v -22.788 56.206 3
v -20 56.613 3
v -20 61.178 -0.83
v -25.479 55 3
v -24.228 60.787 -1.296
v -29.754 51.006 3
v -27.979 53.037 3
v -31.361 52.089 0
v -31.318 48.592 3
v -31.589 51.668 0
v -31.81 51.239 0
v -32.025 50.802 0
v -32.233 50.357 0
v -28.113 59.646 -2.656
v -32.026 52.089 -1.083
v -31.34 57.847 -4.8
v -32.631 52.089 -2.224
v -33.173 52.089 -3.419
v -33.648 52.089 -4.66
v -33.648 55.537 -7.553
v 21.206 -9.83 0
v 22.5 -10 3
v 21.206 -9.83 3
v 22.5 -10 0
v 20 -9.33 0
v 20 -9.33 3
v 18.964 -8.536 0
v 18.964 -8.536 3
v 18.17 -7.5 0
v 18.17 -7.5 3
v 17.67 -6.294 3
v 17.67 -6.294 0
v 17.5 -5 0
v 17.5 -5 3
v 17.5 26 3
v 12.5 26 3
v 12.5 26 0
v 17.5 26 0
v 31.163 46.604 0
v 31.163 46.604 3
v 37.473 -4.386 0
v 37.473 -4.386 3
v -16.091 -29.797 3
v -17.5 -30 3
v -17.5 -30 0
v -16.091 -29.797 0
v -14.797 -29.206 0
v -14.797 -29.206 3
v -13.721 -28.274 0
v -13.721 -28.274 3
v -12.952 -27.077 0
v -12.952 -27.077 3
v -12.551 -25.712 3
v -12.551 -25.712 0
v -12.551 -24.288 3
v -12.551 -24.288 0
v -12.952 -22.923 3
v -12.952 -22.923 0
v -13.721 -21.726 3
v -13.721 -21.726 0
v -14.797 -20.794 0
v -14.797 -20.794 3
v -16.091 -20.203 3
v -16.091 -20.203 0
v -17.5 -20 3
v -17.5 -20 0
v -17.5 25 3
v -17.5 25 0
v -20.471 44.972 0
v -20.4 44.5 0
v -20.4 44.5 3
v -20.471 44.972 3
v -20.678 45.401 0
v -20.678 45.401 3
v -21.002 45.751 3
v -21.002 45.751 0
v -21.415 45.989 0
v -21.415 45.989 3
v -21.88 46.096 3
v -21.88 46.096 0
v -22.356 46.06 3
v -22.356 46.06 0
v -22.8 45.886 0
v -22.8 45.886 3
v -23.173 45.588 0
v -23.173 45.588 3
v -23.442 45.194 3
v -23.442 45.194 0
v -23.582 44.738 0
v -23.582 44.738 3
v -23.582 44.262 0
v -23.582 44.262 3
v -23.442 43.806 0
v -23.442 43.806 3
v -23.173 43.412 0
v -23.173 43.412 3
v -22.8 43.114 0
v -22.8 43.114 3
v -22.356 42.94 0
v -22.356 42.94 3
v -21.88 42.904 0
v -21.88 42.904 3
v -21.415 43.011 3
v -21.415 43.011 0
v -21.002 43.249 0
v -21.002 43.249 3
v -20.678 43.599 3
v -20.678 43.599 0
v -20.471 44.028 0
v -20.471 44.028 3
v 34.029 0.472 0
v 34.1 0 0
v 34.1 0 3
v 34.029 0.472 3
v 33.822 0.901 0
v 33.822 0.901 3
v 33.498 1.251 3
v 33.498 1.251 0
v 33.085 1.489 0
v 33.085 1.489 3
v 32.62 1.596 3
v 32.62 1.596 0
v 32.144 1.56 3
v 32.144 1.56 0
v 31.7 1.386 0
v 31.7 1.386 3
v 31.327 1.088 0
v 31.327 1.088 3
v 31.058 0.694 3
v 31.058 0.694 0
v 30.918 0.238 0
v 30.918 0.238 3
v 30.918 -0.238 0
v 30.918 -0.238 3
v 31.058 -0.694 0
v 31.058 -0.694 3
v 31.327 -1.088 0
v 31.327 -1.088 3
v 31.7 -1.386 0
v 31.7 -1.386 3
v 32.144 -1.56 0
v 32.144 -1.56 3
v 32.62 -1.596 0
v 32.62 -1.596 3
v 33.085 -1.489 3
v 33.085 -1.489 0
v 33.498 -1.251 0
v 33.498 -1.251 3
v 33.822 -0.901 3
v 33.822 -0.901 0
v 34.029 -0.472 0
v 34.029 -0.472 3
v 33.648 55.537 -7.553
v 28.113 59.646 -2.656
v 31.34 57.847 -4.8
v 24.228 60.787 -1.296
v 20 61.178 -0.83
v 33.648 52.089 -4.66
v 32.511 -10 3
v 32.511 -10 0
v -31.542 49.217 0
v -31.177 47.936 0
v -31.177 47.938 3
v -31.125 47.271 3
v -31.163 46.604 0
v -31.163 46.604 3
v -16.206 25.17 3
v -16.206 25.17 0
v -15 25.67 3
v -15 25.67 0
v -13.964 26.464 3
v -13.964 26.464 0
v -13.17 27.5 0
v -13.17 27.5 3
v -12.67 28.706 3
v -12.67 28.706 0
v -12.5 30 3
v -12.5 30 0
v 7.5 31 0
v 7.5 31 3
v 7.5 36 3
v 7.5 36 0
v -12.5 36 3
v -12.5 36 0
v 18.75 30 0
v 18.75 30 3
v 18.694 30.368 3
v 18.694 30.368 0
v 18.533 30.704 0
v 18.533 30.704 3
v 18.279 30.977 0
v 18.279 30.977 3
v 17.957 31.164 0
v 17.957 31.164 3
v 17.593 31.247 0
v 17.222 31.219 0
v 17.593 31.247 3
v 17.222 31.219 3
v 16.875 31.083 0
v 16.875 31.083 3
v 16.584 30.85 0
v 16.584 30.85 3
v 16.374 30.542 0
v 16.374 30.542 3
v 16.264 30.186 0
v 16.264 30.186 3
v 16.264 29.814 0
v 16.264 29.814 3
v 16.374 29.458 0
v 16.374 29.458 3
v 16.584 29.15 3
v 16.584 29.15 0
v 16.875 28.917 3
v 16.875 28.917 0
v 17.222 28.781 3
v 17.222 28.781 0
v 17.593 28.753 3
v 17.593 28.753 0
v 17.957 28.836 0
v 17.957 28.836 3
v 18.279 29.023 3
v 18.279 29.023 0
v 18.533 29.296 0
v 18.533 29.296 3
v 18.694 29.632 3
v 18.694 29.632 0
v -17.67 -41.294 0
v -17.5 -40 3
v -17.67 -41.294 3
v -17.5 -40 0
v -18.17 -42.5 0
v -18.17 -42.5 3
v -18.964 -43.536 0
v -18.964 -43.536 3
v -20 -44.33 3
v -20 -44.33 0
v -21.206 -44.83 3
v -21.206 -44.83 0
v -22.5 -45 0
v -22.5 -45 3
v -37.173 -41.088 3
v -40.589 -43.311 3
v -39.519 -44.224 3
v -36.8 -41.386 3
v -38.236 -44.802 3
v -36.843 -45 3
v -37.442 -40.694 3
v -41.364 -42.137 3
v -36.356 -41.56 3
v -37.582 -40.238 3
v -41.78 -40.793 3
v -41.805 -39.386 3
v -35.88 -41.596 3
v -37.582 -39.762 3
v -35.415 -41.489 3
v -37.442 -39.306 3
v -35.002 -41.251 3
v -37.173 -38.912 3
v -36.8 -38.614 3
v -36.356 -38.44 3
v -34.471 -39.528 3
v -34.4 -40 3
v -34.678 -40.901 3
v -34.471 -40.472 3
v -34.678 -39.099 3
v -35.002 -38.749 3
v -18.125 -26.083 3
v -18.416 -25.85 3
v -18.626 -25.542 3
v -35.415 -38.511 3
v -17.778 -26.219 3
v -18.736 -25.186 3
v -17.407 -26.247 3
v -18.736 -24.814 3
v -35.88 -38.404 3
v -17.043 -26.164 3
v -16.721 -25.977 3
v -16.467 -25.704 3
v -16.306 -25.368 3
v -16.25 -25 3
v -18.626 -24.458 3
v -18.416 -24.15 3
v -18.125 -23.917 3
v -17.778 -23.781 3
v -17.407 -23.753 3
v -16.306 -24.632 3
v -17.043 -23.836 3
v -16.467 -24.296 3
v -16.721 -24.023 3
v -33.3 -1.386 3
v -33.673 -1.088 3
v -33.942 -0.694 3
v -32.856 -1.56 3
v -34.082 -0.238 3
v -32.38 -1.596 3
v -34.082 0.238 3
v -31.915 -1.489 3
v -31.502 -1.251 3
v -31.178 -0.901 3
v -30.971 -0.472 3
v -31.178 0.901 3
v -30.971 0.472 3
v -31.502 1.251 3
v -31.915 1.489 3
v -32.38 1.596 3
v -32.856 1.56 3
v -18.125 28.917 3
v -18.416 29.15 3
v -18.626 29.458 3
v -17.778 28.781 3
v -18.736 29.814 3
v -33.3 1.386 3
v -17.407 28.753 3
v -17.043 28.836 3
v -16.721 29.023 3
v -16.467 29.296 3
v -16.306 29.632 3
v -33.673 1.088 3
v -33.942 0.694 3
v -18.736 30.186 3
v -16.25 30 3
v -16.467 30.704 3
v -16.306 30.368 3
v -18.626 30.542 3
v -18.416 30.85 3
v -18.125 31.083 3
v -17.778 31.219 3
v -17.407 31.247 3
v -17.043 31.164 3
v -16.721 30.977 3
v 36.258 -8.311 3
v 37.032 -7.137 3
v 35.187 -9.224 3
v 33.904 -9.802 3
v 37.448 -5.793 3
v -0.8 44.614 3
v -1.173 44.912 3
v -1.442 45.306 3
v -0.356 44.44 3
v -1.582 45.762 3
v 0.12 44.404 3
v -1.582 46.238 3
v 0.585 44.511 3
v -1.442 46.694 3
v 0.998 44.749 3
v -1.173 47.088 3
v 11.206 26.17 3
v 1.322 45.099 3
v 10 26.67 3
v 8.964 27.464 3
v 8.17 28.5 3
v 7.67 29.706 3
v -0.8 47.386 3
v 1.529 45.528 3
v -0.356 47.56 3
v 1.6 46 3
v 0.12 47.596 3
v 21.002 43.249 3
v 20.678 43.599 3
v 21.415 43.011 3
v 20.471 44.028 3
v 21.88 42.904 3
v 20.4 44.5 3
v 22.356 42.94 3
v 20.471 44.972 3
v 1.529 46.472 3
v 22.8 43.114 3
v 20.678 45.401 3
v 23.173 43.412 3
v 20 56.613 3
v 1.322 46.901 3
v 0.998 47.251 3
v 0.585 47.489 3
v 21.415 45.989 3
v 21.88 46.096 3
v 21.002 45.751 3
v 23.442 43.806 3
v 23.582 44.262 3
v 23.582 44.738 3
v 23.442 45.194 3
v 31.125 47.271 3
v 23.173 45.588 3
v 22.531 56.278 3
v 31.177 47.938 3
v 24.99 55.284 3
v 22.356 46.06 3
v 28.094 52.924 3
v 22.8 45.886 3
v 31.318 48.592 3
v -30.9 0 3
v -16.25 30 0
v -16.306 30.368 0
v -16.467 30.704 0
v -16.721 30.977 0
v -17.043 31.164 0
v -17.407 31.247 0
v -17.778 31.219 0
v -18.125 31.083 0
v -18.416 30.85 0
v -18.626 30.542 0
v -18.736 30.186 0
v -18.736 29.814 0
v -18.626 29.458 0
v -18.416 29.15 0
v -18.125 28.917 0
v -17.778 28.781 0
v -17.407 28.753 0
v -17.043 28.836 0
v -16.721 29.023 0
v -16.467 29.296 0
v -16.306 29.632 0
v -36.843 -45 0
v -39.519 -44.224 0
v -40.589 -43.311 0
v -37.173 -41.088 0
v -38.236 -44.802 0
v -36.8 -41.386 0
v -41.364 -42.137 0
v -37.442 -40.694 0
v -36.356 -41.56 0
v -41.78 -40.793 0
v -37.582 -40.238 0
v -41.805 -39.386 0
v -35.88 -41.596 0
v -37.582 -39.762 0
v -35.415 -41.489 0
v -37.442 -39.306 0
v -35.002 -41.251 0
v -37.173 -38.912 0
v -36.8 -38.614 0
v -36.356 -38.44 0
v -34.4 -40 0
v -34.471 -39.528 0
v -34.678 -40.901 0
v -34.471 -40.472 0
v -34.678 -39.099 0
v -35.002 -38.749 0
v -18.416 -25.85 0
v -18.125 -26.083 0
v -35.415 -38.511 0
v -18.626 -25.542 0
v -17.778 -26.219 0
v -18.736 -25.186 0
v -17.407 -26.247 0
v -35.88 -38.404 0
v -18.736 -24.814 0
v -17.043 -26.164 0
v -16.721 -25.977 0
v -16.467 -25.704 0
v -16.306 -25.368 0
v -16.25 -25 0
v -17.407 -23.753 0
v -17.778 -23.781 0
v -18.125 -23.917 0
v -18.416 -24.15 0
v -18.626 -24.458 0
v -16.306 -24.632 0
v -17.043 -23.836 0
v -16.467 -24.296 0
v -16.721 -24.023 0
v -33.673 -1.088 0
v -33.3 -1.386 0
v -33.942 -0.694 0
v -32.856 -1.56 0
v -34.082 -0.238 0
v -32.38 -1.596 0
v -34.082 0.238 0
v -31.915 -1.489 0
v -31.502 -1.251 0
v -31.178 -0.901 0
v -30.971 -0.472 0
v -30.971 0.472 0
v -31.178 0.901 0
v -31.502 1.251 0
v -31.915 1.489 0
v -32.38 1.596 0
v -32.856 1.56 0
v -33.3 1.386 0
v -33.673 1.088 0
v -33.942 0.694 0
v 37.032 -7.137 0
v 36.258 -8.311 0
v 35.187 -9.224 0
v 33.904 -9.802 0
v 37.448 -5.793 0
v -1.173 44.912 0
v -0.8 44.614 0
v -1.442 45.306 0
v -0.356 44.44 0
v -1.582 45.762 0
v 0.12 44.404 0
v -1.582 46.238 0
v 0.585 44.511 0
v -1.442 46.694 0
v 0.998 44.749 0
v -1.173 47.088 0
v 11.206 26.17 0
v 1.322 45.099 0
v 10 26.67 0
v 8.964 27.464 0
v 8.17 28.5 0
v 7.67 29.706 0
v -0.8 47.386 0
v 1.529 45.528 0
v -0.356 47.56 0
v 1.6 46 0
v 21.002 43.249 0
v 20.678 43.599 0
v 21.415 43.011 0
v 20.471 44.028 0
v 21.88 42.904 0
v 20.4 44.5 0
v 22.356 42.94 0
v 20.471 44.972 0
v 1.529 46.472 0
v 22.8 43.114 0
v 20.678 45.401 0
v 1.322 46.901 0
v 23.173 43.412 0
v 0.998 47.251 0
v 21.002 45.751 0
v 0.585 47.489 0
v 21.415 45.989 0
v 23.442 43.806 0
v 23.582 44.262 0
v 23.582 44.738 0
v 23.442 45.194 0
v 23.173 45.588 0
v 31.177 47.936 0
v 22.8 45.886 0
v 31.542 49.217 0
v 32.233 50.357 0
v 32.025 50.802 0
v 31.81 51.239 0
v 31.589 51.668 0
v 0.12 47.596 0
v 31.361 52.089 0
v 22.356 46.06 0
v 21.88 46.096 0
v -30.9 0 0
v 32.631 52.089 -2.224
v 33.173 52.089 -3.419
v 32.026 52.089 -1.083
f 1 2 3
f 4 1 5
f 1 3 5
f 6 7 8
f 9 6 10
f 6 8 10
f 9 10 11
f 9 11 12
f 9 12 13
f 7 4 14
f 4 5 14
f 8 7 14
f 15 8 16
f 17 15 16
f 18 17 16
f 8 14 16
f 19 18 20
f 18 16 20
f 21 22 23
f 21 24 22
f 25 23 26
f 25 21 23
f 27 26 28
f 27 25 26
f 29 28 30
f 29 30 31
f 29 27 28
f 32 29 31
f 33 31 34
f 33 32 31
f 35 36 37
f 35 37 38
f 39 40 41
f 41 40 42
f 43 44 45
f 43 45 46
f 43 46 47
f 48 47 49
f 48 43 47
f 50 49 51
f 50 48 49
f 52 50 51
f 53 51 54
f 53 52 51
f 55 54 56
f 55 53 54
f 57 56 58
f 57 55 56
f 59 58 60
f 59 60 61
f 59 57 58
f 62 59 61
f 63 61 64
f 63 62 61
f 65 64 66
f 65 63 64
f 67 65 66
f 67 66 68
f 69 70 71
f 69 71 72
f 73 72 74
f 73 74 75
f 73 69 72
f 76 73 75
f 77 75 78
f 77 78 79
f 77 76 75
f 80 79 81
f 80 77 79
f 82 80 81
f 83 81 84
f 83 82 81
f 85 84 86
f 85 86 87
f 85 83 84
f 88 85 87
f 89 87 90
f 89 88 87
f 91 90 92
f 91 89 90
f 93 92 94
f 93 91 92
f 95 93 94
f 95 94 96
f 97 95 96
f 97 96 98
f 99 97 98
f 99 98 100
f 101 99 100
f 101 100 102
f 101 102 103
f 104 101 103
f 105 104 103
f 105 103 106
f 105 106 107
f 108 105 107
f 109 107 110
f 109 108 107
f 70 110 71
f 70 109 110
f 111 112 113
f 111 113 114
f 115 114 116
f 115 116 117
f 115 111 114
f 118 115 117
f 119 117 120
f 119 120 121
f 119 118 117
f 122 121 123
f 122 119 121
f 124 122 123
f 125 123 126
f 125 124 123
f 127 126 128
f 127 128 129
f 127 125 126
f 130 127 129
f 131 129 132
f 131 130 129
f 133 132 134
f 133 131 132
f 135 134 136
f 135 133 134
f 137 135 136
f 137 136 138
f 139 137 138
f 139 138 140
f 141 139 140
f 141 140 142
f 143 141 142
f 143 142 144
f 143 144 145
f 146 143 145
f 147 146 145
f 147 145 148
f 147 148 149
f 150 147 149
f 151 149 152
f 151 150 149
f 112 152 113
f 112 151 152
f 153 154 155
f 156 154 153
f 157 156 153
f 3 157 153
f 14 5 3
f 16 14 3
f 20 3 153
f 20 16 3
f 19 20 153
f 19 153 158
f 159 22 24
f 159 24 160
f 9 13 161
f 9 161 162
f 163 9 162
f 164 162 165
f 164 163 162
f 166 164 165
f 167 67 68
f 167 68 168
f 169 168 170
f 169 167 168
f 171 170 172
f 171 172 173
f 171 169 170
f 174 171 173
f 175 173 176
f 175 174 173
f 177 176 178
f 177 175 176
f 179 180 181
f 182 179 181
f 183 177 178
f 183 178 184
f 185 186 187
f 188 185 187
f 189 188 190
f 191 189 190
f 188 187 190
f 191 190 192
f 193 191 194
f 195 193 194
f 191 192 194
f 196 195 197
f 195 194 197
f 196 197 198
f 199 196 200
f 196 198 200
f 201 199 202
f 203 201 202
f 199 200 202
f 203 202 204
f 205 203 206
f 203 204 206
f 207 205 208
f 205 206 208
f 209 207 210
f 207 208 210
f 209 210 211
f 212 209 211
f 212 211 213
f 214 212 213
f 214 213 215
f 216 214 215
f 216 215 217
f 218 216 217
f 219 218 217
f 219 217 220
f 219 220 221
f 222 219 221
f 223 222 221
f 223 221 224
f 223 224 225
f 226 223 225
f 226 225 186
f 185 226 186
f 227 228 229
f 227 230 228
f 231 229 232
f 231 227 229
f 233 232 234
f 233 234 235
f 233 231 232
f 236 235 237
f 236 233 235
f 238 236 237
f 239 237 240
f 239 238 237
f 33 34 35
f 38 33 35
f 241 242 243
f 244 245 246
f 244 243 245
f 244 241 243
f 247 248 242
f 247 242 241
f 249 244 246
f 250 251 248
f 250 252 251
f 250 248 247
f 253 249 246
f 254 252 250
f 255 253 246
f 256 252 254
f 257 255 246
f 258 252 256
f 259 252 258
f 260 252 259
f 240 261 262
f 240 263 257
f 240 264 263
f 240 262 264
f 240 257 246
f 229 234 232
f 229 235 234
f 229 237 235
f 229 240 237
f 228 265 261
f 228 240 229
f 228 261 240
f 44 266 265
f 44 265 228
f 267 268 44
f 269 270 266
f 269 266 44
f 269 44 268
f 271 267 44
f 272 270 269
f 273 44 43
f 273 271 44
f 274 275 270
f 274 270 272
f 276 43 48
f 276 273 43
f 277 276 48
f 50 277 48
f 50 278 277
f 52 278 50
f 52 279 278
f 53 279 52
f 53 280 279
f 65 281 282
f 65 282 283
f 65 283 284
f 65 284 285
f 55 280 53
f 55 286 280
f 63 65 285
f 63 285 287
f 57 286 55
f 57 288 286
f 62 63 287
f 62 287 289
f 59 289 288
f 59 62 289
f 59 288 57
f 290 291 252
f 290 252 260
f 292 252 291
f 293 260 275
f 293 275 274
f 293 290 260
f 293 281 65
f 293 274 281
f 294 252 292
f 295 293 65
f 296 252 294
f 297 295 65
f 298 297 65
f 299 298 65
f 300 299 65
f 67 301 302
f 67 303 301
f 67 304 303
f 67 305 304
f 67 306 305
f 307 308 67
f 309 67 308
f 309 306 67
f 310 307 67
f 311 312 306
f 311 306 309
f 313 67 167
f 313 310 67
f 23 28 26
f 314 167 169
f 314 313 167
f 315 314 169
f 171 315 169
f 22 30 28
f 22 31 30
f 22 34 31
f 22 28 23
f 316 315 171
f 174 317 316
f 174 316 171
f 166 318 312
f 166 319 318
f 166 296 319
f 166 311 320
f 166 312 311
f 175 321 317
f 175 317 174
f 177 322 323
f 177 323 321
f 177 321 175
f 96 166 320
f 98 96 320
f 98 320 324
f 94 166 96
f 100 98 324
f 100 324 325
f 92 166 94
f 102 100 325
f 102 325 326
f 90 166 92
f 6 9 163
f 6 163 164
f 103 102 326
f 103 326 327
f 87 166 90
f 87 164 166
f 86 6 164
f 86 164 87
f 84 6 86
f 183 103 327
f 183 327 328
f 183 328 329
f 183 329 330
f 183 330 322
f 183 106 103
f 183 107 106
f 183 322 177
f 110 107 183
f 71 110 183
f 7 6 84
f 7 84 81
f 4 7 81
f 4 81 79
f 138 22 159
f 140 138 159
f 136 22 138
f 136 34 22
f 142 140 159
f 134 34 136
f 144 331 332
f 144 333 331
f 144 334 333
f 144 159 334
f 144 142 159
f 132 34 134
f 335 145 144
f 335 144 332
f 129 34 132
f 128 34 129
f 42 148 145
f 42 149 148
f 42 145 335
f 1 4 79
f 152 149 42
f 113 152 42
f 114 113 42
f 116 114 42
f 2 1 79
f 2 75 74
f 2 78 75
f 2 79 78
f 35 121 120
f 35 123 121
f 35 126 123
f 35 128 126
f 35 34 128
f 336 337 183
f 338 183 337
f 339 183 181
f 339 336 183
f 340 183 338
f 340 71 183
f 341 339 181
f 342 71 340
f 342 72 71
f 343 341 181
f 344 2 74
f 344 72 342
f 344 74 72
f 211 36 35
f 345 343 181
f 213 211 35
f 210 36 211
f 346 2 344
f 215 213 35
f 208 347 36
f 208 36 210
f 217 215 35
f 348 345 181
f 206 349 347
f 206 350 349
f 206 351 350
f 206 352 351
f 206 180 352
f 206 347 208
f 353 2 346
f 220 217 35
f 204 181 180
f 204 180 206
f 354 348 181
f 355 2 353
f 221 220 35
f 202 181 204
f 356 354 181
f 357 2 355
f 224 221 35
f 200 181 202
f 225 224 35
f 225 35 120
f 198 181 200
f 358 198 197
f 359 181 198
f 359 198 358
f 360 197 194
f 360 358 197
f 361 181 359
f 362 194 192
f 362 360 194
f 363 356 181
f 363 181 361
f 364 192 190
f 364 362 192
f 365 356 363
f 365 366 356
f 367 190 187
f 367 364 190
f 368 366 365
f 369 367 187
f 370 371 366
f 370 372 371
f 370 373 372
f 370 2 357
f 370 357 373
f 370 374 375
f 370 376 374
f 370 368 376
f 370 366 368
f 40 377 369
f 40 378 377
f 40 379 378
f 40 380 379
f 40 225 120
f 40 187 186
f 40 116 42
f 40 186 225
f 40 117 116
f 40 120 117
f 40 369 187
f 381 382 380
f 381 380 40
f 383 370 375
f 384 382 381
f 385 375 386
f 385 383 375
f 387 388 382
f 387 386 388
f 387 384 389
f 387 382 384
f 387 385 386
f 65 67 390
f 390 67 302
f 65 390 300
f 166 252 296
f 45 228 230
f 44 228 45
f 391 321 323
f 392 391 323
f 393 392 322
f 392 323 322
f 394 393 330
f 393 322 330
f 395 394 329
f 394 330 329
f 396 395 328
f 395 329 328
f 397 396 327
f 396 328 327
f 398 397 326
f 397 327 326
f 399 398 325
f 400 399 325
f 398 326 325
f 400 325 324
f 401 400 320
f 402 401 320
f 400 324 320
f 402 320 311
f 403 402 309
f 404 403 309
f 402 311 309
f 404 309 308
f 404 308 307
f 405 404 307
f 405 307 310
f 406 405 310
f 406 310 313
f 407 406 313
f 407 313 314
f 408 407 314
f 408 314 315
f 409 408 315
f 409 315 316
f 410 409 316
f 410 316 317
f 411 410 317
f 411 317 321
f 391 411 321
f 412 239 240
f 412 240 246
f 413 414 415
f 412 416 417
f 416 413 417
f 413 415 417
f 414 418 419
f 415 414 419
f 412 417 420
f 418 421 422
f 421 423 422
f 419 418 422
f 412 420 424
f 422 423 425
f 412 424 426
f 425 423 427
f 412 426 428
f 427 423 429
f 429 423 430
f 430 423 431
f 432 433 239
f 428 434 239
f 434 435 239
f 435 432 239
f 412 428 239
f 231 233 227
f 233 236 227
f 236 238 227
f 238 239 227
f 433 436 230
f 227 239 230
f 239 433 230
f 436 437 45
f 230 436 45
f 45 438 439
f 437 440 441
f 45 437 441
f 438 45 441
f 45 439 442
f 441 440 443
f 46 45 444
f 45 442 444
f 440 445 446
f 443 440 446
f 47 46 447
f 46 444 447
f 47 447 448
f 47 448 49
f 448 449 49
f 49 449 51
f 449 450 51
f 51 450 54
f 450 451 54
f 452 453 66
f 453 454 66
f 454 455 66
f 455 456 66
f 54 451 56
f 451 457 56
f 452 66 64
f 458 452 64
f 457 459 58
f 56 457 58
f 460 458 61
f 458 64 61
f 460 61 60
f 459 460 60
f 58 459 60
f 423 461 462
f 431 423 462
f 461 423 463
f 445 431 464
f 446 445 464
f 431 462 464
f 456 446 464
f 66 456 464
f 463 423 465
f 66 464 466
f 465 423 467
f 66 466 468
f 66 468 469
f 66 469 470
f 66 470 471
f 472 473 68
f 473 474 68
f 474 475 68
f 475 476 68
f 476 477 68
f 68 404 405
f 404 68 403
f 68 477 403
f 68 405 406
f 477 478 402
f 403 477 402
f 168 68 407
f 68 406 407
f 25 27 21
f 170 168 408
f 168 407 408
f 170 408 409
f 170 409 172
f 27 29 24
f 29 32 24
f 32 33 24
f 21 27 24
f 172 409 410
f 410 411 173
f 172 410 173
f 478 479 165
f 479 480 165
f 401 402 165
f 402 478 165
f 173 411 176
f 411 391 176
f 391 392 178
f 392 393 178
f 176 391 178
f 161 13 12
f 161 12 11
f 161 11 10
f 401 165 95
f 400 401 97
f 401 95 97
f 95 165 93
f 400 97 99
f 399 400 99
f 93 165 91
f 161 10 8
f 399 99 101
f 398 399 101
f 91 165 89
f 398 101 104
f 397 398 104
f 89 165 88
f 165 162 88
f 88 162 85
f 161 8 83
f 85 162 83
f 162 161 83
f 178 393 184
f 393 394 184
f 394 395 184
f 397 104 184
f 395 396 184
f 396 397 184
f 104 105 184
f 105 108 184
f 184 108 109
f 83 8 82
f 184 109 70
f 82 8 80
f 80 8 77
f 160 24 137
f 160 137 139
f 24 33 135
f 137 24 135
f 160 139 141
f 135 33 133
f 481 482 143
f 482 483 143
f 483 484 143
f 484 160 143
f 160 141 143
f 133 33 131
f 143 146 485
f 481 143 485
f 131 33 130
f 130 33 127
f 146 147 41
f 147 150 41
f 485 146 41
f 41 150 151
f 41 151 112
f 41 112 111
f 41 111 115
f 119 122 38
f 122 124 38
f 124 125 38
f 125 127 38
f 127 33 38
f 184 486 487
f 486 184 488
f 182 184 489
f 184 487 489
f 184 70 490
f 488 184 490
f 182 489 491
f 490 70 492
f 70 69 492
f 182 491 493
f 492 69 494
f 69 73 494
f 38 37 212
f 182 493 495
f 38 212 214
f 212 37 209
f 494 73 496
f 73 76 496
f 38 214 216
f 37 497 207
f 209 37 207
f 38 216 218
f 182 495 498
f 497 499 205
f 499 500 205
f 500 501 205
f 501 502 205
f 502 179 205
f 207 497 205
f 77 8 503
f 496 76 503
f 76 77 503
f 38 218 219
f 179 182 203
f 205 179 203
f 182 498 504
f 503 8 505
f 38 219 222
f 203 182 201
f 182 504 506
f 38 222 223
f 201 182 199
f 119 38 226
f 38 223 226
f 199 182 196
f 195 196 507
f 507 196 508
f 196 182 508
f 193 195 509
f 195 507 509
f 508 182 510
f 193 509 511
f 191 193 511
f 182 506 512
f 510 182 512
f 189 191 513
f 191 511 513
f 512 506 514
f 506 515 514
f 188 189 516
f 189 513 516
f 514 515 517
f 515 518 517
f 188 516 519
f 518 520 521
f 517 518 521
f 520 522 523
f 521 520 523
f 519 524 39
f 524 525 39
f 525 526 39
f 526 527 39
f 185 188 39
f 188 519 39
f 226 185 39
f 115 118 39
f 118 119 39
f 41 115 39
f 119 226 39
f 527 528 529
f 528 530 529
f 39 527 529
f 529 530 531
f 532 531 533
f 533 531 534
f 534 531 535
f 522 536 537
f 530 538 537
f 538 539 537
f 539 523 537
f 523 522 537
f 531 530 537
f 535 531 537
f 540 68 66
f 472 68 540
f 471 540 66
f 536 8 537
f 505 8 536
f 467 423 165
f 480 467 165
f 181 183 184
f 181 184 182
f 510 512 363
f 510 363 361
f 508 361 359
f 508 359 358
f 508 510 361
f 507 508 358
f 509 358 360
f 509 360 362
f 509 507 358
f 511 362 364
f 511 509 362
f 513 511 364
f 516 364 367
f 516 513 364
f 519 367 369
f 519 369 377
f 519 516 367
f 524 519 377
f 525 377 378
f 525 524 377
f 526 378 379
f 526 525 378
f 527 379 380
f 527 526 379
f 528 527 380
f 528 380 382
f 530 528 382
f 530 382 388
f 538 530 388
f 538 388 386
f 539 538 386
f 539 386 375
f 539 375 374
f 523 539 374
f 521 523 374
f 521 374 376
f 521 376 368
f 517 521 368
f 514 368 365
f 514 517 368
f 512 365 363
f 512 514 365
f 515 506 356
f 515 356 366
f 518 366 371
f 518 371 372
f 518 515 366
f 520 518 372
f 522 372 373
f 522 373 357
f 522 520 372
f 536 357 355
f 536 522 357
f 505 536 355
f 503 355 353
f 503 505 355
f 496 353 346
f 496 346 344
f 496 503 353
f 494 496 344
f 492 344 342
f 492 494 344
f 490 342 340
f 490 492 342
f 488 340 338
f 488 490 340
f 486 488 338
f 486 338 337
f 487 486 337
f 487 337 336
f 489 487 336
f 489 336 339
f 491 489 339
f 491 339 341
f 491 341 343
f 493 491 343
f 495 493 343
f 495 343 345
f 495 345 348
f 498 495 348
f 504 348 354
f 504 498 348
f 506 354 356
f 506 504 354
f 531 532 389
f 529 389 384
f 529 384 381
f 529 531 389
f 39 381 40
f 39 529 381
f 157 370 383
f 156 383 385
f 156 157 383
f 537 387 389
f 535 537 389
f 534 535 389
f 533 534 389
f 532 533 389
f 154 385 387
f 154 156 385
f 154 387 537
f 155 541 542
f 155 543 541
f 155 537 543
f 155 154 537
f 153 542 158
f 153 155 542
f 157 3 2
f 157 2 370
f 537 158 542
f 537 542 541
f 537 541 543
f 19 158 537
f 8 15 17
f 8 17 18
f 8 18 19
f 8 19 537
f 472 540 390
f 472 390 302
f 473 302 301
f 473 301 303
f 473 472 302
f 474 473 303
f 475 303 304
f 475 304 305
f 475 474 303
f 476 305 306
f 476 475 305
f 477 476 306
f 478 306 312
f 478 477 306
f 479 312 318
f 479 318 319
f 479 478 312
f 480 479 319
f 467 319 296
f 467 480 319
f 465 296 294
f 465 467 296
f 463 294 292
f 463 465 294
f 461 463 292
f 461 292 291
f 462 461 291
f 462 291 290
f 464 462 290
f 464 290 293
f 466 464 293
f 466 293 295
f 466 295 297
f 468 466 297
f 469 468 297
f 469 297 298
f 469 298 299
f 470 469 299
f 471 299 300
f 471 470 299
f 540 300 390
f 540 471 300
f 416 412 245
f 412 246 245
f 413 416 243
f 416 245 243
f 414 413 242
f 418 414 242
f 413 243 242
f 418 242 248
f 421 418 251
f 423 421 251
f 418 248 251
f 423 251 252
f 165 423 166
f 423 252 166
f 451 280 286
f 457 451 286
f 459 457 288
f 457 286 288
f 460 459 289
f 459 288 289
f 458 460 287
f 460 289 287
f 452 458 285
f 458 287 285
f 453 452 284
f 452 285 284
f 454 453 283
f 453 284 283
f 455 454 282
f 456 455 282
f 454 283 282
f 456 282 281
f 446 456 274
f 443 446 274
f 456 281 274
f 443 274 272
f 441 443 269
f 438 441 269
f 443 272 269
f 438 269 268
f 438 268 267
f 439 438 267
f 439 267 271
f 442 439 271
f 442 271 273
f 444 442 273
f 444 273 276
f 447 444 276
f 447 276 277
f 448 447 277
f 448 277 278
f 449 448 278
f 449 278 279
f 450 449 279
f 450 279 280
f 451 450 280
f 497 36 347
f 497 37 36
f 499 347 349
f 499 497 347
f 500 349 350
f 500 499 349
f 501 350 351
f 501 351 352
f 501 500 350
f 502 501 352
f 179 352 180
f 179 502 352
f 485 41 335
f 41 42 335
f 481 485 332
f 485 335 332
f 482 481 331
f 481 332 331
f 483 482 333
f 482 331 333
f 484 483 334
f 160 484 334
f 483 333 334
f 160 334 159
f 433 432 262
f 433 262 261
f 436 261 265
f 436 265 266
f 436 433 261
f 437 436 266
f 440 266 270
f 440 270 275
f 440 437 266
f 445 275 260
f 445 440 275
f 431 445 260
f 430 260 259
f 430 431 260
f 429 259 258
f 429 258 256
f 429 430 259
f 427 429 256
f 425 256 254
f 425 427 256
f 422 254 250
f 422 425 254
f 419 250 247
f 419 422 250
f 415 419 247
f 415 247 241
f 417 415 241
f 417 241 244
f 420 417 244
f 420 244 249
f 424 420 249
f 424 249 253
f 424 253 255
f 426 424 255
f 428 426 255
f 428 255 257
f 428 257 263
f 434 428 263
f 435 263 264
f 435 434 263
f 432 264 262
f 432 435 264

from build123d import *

# Parameters (mm, degrees)
SKETCH_1_R                  = 1.6
EXTRUDE_1_DEPTH             = 3
CUT_EXTRUDE_1_REACH         = 72.365
SKETCH_2_W                  = 30
SKETCH_2_H                  = 35
CUT_EXTRUDE_2_REACH         = 72.365
SKETCH_3_W                  = 35
SKETCH_3_H                  = 55
CUT_EXTRUDE_3_REACH         = 72.365
SKETCH_4_W                  = 25
SKETCH_4_H                  = 10
EXTRUDE_2_REACH             = 72.365
EXTRUDE_2_DIRECTION_2_REACH = 72.365
EXTRUDE_3_DEPTH             = 35
EXTRUDE_3_DEPTH_BACK        = 35
FILLET_1_R                  = 5
CUT_EXTRUDE_5_REACH         = 99.66
SKETCH_8_W                  = 70
SKETCH_8_H                  = 5
CUT_EXTRUDE_4_REACH         = 99.66
CUT_EXTRUDE_6_REACH         = 101.977
SKETCH_9_W                  = 30
SKETCH_9_H                  = 3
FILLET_2_R                  = 5
CUT_EXTRUDE_7_REACH         = 76.866
SKETCH_10_R                 = 1.25
SKETCH_11_R                 = 5
SKETCH_11_R_2               = 1.25
EXTRUDE_4_DEPTH             = 3


with BuildPart() as part:
    # 草图1 → 凸台-拉伸1 (new body)
    with BuildSketch(Plane.XY):
        Polygon((-30, 56), (30, 56), (42.5, -45), (-42.5, -45), align=None)
        with Locations((-32.5, 0)):
            Circle(SKETCH_1_R, mode=Mode.SUBTRACT)
        with Locations((32.5, 0)):
            Circle(SKETCH_1_R, mode=Mode.SUBTRACT)
        with Locations((-22, 44.5)):
            Circle(SKETCH_1_R, mode=Mode.SUBTRACT)
        with Locations(Location((22, 44.5, 0), (0, 0, 180))):
            Circle(SKETCH_1_R, mode=Mode.SUBTRACT)
        with Locations((0, 46)):
            Circle(SKETCH_1_R, mode=Mode.SUBTRACT)
        with Locations((-36, -40)):
            Circle(SKETCH_1_R, mode=Mode.SUBTRACT)
    extrude(amount=EXTRUDE_1_DEPTH)

    # 草图2 → 切除-拉伸1 (cut, up to next)
    with BuildSketch(Plane.XY.offset(3), mode=Mode.PRIVATE) as cut_extrude_1_sk1:
        with Locations((27.5, -27.5)):
            Rectangle(SKETCH_2_W, SKETCH_2_H)
    cut_extrude_1_tool1 = extrude(cut_extrude_1_sk1.sketch, amount=-CUT_EXTRUDE_1_REACH, mode=Mode.PRIVATE) & part.part
    add(cut_extrude_1_tool1.solids().sort_by_distance((27.5, -27.5, 3))[0], mode=Mode.SUBTRACT)

    # 草图3 → 切除-拉伸2 (cut, up to next)
    with BuildSketch(Plane.XY.offset(3), mode=Mode.PRIVATE) as cut_extrude_2_sk1:
        with Locations((0, -1.5)):
            Rectangle(SKETCH_3_W, SKETCH_3_H)
    cut_extrude_2_tool1 = extrude(cut_extrude_2_sk1.sketch, amount=-CUT_EXTRUDE_2_REACH, mode=Mode.PRIVATE) & part.part
    add(cut_extrude_2_tool1.solids().sort_by_distance((0, -1.5, 3))[0], mode=Mode.SUBTRACT)

    # 草图4 → 切除-拉伸3 (cut, up to next)
    with BuildSketch(Plane.XY.offset(3), mode=Mode.PRIVATE) as cut_extrude_3_sk1:
        with Locations((-5, 31)):
            Rectangle(SKETCH_4_W, SKETCH_4_H)
    cut_extrude_3_tool1 = extrude(cut_extrude_3_sk1.sketch, amount=-CUT_EXTRUDE_3_REACH, mode=Mode.PRIVATE) & part.part
    add(cut_extrude_3_tool1.solids().sort_by_distance((-5, 31, 3))[0], mode=Mode.SUBTRACT)

    # 凸台-拉伸2: up to this plane
    extrude_2_end = Plane(origin=(30, 56, 3), z_dir=(-0.9924283093332451, -0.12282528580856998, 0))
    # 草图5 → 凸台-拉伸2 (add, up to the surface)
    with BuildSketch(Plane(origin=(0, 0, 0), x_dir=(0, 0, -1), z_dir=(1, 0, 0)), mode=Mode.PRIVATE) as extrude_2_sk1:
        Polygon((0, 56), (-3, 58.517298894), (-3, 56), align=None)
    extrude_2_tool1 = split(extrude(extrude_2_sk1.sketch, amount=EXTRUDE_2_REACH, mode=Mode.PRIVATE), bisect_by=extrude_2_end, keep=Keep.BOTH, mode=Mode.PRIVATE)
    add(extrude_2_tool1.solids().sort_by_distance((0, 56.8391, 2))[0])

    # 凸台-拉伸2 direction 2: up to this plane
    extrude_2_direction_2_end = Plane(origin=(-30, 56, 3), z_dir=(0.9924283093332451, -0.12282528580856998, 0))
    # 草图5 → 凸台-拉伸2 direction 2 (add, up to the surface)
    with BuildSketch(Plane(origin=(0, 0, 0), x_dir=(0, 0, -1), z_dir=(1, 0, 0)), mode=Mode.PRIVATE) as extrude_2_direction_2_sk1:
        Polygon((0, 56), (-3, 58.517298894), (-3, 56), align=None)
    extrude_2_direction_2_tool1 = split(extrude(extrude_2_direction_2_sk1.sketch, amount=-EXTRUDE_2_DIRECTION_2_REACH, mode=Mode.PRIVATE), bisect_by=extrude_2_direction_2_end, keep=Keep.BOTH, mode=Mode.PRIVATE)
    add(extrude_2_direction_2_tool1.solids().sort_by_distance((0, 56.8391, 2))[0])

    # 草图6 → 凸台-拉伸3 (add, two sides: drawn at the far end of the back side and taken through both)
    with BuildSketch(Plane(origin=(0, 0, 0), x_dir=(0, 0, -1), z_dir=(1, 0, 0)).offset(-EXTRUDE_3_DEPTH_BACK)):
        Polygon((-3, 58.517298894), (-3, 64.391631696), (7.552988675, 55.536622791), (4.660444431, 52.089422797), (-3, 52.089422797), align=None)
    extrude(amount=EXTRUDE_3_DEPTH + EXTRUDE_3_DEPTH_BACK)

    # 圆角1
    # the kernel refuses this fillet: 5 mm, written as the material it adds along each edge
    with BuildSketch(Plane(origin=(-30.483982327, 52.089422797, 3), x_dir=(-1, 0, 0), z_dir=(0, 0, -1)), Plane(origin=(30.483982327, 52.089422797, 0), x_dir=(1, 0, 0), z_dir=(0, 0, 1))) as fillet_1_piece_1:
        with BuildLine():
            CenterArc((5.641090005, -4.871777114), FILLET_1_R, 103.003728842, 84.05145722)
            Line((0.678948458, -5.485903543), (0.579705627, -5.498186072))
            Line((0.579705627, -5.498186072), (-0.099242831, -0.012282529))
            Line((-0.099242831, -0.012282529), (0, 0.1))
            ThreePointArc((0, 0.1), (2.258008836, 0.1), (4.493516226, 0.097435542))
            Line((4.493516226, 0.097435542), (4.516017673, 0))
        make_face()
    extrude(amount=3)

    # 草图8 → 切除-拉伸5 (cut, up to next)
    with BuildSketch(Plane(origin=(0, 36.309348969, -30.467161328), x_dir=(1, 0, 0), z_dir=(0, 0.7660444431189815, -0.6427876096865354)), mode=Mode.PRIVATE) as cut_extrude_5_sk1:
        with Locations((0, -41.188276351)):
            Rectangle(SKETCH_8_W, SKETCH_8_H)
    cut_extrude_5_tool1 = extrude(cut_extrude_5_sk1.sketch, amount=-CUT_EXTRUDE_5_REACH, mode=Mode.PRIVATE) & part.part
    add(cut_extrude_5_tool1.solids().sort_by_distance((0, 62.784663, 1.084889))[0], mode=Mode.SUBTRACT)

    # 草图7 → 切除-拉伸4 (cut, up to next)
    with BuildSketch(Plane(origin=(0, 36.309348969, -30.467161328), x_dir=(1, 0, 0), z_dir=(0, 0.7660444431189815, -0.6427876096865354)), mode=Mode.PRIVATE) as cut_extrude_4_sk1:
        with BuildLine():
            Line((-35, -23.688276351), (-35, -38.688276351))
            Line((-35, -38.688276351), (-20, -38.688276351))
            ThreePointArc((-20, -38.688276351), (-30.606601718, -34.294878069), (-35, -23.688276351))
        make_face()
    cut_extrude_4_tool1 = extrude(cut_extrude_4_sk1.sketch, amount=-CUT_EXTRUDE_4_REACH, mode=Mode.PRIVATE) & part.part
    # 草图7 → 切除-拉伸4 (cut, up to next)
    with BuildSketch(Plane(origin=(0, 36.309348969, -30.467161328), x_dir=(1, 0, 0), z_dir=(0, 0.7660444431189815, -0.6427876096865354)), mode=Mode.PRIVATE) as cut_extrude_4_sk2:
        with BuildLine():
            Line((35, -38.688276351), (20, -38.688276351))
            ThreePointArc((20, -38.688276351), (30.606601718, -34.294878069), (35, -23.688276351))
            Line((35, -23.688276351), (35, -38.688276351))
        make_face()
    cut_extrude_4_tool2 = extrude(cut_extrude_4_sk2.sketch, amount=-CUT_EXTRUDE_4_REACH, mode=Mode.PRIVATE) & part.part
    add(cut_extrude_4_tool1.solids().sort_by_distance((-31.649481, 59.024021, -3.396869))[0], mode=Mode.SUBTRACT)
    add(cut_extrude_4_tool2.solids().sort_by_distance((31.649481, 59.024021, -3.396869))[0], mode=Mode.SUBTRACT)

    # 草图9 → 切除-拉伸6 (cut, up to next)
    with BuildSketch(Plane(origin=(0, -29, 0), x_dir=(1, 0, 0), z_dir=(0, 1, 0)), mode=Mode.PRIVATE) as cut_extrude_6_sk1:
        with Locations((-2.5, -1.5)):
            Rectangle(SKETCH_9_W, SKETCH_9_H)
    cut_extrude_6_tool1 = extrude(cut_extrude_6_sk1.sketch, amount=-CUT_EXTRUDE_6_REACH, mode=Mode.PRIVATE) & part.part
    add(cut_extrude_6_tool1.solids().sort_by_distance((-2.5, -29, 1.5))[0], mode=Mode.SUBTRACT)

    # 圆角2
    fillet_2_edges = [part.edges().sort_by_distance(p)[0] for p in [
        (-17.5, -45, 1.5),
        (38.168316832, -10, 1.5),
        (17.5, -10, 1.5),
        (7.5, 26, 1.5),
        (-42.5, -45, 1.5),
    ]]
    fillet(fillet_2_edges, radius=FILLET_2_R)

    # 草图10 → 切除-拉伸7 (cut, up to next)
    with BuildSketch(Plane.XY.offset(3), mode=Mode.PRIVATE) as cut_extrude_7_sk1:
        with Locations((17.5, 30)):
            Circle(SKETCH_10_R)
    cut_extrude_7_tool1 = extrude(cut_extrude_7_sk1.sketch, amount=-CUT_EXTRUDE_7_REACH, mode=Mode.PRIVATE) & part.part
    # 草图10 → 切除-拉伸7 (cut, up to next)
    with BuildSketch(Plane.XY.offset(3), mode=Mode.PRIVATE) as cut_extrude_7_sk2:
        with Locations((-17.5, 30)):
            Circle(SKETCH_10_R)
    cut_extrude_7_tool2 = extrude(cut_extrude_7_sk2.sketch, amount=-CUT_EXTRUDE_7_REACH, mode=Mode.PRIVATE) & part.part
    # 草图10 → 切除-拉伸7 (cut, up to next)
    with BuildSketch(Plane.XY.offset(3), mode=Mode.PRIVATE) as cut_extrude_7_sk3:
        with Locations((-17.5, -25)):
            Circle(SKETCH_10_R)
    cut_extrude_7_tool3 = extrude(cut_extrude_7_sk3.sketch, amount=-CUT_EXTRUDE_7_REACH, mode=Mode.PRIVATE) & part.part
    add(cut_extrude_7_tool1.solids().sort_by_distance((17.5, 30, 3))[0], mode=Mode.SUBTRACT)
    add(cut_extrude_7_tool2.solids().sort_by_distance((-17.5, 30, 3))[0], mode=Mode.SUBTRACT)
    add(cut_extrude_7_tool3.solids().sort_by_distance((-17.5, -25, 3))[0], mode=Mode.SUBTRACT)

    # 草图11 → 凸台-拉伸4 (add)
    # profile 1 of 2: a face of its own
    with BuildSketch(Plane.XY.offset(3)):
        with Locations((-17.5, -25)):
            Circle(SKETCH_11_R)
        with Locations((-17.5, -25)):
            Circle(SKETCH_11_R_2, mode=Mode.SUBTRACT)
    # profile 2 of 2: a face of its own
    with BuildSketch(Plane.XY.offset(3)):
        with BuildLine():
            Line((-12.5, 30), (-12.5, 36))
            Line((-12.5, 36), (-17.5, 36))
            Line((-17.5, 36), (-17.5, 35))
            ThreePointArc((-17.5, 35), (-21.035533906, 26.464466094), (-12.5, 30))
        make_face()
        with Locations((-17.5, 30)):
            Circle(SKETCH_11_R_2, mode=Mode.SUBTRACT)
    extrude(amount=-EXTRUDE_4_DEPTH)


solid = part.part
